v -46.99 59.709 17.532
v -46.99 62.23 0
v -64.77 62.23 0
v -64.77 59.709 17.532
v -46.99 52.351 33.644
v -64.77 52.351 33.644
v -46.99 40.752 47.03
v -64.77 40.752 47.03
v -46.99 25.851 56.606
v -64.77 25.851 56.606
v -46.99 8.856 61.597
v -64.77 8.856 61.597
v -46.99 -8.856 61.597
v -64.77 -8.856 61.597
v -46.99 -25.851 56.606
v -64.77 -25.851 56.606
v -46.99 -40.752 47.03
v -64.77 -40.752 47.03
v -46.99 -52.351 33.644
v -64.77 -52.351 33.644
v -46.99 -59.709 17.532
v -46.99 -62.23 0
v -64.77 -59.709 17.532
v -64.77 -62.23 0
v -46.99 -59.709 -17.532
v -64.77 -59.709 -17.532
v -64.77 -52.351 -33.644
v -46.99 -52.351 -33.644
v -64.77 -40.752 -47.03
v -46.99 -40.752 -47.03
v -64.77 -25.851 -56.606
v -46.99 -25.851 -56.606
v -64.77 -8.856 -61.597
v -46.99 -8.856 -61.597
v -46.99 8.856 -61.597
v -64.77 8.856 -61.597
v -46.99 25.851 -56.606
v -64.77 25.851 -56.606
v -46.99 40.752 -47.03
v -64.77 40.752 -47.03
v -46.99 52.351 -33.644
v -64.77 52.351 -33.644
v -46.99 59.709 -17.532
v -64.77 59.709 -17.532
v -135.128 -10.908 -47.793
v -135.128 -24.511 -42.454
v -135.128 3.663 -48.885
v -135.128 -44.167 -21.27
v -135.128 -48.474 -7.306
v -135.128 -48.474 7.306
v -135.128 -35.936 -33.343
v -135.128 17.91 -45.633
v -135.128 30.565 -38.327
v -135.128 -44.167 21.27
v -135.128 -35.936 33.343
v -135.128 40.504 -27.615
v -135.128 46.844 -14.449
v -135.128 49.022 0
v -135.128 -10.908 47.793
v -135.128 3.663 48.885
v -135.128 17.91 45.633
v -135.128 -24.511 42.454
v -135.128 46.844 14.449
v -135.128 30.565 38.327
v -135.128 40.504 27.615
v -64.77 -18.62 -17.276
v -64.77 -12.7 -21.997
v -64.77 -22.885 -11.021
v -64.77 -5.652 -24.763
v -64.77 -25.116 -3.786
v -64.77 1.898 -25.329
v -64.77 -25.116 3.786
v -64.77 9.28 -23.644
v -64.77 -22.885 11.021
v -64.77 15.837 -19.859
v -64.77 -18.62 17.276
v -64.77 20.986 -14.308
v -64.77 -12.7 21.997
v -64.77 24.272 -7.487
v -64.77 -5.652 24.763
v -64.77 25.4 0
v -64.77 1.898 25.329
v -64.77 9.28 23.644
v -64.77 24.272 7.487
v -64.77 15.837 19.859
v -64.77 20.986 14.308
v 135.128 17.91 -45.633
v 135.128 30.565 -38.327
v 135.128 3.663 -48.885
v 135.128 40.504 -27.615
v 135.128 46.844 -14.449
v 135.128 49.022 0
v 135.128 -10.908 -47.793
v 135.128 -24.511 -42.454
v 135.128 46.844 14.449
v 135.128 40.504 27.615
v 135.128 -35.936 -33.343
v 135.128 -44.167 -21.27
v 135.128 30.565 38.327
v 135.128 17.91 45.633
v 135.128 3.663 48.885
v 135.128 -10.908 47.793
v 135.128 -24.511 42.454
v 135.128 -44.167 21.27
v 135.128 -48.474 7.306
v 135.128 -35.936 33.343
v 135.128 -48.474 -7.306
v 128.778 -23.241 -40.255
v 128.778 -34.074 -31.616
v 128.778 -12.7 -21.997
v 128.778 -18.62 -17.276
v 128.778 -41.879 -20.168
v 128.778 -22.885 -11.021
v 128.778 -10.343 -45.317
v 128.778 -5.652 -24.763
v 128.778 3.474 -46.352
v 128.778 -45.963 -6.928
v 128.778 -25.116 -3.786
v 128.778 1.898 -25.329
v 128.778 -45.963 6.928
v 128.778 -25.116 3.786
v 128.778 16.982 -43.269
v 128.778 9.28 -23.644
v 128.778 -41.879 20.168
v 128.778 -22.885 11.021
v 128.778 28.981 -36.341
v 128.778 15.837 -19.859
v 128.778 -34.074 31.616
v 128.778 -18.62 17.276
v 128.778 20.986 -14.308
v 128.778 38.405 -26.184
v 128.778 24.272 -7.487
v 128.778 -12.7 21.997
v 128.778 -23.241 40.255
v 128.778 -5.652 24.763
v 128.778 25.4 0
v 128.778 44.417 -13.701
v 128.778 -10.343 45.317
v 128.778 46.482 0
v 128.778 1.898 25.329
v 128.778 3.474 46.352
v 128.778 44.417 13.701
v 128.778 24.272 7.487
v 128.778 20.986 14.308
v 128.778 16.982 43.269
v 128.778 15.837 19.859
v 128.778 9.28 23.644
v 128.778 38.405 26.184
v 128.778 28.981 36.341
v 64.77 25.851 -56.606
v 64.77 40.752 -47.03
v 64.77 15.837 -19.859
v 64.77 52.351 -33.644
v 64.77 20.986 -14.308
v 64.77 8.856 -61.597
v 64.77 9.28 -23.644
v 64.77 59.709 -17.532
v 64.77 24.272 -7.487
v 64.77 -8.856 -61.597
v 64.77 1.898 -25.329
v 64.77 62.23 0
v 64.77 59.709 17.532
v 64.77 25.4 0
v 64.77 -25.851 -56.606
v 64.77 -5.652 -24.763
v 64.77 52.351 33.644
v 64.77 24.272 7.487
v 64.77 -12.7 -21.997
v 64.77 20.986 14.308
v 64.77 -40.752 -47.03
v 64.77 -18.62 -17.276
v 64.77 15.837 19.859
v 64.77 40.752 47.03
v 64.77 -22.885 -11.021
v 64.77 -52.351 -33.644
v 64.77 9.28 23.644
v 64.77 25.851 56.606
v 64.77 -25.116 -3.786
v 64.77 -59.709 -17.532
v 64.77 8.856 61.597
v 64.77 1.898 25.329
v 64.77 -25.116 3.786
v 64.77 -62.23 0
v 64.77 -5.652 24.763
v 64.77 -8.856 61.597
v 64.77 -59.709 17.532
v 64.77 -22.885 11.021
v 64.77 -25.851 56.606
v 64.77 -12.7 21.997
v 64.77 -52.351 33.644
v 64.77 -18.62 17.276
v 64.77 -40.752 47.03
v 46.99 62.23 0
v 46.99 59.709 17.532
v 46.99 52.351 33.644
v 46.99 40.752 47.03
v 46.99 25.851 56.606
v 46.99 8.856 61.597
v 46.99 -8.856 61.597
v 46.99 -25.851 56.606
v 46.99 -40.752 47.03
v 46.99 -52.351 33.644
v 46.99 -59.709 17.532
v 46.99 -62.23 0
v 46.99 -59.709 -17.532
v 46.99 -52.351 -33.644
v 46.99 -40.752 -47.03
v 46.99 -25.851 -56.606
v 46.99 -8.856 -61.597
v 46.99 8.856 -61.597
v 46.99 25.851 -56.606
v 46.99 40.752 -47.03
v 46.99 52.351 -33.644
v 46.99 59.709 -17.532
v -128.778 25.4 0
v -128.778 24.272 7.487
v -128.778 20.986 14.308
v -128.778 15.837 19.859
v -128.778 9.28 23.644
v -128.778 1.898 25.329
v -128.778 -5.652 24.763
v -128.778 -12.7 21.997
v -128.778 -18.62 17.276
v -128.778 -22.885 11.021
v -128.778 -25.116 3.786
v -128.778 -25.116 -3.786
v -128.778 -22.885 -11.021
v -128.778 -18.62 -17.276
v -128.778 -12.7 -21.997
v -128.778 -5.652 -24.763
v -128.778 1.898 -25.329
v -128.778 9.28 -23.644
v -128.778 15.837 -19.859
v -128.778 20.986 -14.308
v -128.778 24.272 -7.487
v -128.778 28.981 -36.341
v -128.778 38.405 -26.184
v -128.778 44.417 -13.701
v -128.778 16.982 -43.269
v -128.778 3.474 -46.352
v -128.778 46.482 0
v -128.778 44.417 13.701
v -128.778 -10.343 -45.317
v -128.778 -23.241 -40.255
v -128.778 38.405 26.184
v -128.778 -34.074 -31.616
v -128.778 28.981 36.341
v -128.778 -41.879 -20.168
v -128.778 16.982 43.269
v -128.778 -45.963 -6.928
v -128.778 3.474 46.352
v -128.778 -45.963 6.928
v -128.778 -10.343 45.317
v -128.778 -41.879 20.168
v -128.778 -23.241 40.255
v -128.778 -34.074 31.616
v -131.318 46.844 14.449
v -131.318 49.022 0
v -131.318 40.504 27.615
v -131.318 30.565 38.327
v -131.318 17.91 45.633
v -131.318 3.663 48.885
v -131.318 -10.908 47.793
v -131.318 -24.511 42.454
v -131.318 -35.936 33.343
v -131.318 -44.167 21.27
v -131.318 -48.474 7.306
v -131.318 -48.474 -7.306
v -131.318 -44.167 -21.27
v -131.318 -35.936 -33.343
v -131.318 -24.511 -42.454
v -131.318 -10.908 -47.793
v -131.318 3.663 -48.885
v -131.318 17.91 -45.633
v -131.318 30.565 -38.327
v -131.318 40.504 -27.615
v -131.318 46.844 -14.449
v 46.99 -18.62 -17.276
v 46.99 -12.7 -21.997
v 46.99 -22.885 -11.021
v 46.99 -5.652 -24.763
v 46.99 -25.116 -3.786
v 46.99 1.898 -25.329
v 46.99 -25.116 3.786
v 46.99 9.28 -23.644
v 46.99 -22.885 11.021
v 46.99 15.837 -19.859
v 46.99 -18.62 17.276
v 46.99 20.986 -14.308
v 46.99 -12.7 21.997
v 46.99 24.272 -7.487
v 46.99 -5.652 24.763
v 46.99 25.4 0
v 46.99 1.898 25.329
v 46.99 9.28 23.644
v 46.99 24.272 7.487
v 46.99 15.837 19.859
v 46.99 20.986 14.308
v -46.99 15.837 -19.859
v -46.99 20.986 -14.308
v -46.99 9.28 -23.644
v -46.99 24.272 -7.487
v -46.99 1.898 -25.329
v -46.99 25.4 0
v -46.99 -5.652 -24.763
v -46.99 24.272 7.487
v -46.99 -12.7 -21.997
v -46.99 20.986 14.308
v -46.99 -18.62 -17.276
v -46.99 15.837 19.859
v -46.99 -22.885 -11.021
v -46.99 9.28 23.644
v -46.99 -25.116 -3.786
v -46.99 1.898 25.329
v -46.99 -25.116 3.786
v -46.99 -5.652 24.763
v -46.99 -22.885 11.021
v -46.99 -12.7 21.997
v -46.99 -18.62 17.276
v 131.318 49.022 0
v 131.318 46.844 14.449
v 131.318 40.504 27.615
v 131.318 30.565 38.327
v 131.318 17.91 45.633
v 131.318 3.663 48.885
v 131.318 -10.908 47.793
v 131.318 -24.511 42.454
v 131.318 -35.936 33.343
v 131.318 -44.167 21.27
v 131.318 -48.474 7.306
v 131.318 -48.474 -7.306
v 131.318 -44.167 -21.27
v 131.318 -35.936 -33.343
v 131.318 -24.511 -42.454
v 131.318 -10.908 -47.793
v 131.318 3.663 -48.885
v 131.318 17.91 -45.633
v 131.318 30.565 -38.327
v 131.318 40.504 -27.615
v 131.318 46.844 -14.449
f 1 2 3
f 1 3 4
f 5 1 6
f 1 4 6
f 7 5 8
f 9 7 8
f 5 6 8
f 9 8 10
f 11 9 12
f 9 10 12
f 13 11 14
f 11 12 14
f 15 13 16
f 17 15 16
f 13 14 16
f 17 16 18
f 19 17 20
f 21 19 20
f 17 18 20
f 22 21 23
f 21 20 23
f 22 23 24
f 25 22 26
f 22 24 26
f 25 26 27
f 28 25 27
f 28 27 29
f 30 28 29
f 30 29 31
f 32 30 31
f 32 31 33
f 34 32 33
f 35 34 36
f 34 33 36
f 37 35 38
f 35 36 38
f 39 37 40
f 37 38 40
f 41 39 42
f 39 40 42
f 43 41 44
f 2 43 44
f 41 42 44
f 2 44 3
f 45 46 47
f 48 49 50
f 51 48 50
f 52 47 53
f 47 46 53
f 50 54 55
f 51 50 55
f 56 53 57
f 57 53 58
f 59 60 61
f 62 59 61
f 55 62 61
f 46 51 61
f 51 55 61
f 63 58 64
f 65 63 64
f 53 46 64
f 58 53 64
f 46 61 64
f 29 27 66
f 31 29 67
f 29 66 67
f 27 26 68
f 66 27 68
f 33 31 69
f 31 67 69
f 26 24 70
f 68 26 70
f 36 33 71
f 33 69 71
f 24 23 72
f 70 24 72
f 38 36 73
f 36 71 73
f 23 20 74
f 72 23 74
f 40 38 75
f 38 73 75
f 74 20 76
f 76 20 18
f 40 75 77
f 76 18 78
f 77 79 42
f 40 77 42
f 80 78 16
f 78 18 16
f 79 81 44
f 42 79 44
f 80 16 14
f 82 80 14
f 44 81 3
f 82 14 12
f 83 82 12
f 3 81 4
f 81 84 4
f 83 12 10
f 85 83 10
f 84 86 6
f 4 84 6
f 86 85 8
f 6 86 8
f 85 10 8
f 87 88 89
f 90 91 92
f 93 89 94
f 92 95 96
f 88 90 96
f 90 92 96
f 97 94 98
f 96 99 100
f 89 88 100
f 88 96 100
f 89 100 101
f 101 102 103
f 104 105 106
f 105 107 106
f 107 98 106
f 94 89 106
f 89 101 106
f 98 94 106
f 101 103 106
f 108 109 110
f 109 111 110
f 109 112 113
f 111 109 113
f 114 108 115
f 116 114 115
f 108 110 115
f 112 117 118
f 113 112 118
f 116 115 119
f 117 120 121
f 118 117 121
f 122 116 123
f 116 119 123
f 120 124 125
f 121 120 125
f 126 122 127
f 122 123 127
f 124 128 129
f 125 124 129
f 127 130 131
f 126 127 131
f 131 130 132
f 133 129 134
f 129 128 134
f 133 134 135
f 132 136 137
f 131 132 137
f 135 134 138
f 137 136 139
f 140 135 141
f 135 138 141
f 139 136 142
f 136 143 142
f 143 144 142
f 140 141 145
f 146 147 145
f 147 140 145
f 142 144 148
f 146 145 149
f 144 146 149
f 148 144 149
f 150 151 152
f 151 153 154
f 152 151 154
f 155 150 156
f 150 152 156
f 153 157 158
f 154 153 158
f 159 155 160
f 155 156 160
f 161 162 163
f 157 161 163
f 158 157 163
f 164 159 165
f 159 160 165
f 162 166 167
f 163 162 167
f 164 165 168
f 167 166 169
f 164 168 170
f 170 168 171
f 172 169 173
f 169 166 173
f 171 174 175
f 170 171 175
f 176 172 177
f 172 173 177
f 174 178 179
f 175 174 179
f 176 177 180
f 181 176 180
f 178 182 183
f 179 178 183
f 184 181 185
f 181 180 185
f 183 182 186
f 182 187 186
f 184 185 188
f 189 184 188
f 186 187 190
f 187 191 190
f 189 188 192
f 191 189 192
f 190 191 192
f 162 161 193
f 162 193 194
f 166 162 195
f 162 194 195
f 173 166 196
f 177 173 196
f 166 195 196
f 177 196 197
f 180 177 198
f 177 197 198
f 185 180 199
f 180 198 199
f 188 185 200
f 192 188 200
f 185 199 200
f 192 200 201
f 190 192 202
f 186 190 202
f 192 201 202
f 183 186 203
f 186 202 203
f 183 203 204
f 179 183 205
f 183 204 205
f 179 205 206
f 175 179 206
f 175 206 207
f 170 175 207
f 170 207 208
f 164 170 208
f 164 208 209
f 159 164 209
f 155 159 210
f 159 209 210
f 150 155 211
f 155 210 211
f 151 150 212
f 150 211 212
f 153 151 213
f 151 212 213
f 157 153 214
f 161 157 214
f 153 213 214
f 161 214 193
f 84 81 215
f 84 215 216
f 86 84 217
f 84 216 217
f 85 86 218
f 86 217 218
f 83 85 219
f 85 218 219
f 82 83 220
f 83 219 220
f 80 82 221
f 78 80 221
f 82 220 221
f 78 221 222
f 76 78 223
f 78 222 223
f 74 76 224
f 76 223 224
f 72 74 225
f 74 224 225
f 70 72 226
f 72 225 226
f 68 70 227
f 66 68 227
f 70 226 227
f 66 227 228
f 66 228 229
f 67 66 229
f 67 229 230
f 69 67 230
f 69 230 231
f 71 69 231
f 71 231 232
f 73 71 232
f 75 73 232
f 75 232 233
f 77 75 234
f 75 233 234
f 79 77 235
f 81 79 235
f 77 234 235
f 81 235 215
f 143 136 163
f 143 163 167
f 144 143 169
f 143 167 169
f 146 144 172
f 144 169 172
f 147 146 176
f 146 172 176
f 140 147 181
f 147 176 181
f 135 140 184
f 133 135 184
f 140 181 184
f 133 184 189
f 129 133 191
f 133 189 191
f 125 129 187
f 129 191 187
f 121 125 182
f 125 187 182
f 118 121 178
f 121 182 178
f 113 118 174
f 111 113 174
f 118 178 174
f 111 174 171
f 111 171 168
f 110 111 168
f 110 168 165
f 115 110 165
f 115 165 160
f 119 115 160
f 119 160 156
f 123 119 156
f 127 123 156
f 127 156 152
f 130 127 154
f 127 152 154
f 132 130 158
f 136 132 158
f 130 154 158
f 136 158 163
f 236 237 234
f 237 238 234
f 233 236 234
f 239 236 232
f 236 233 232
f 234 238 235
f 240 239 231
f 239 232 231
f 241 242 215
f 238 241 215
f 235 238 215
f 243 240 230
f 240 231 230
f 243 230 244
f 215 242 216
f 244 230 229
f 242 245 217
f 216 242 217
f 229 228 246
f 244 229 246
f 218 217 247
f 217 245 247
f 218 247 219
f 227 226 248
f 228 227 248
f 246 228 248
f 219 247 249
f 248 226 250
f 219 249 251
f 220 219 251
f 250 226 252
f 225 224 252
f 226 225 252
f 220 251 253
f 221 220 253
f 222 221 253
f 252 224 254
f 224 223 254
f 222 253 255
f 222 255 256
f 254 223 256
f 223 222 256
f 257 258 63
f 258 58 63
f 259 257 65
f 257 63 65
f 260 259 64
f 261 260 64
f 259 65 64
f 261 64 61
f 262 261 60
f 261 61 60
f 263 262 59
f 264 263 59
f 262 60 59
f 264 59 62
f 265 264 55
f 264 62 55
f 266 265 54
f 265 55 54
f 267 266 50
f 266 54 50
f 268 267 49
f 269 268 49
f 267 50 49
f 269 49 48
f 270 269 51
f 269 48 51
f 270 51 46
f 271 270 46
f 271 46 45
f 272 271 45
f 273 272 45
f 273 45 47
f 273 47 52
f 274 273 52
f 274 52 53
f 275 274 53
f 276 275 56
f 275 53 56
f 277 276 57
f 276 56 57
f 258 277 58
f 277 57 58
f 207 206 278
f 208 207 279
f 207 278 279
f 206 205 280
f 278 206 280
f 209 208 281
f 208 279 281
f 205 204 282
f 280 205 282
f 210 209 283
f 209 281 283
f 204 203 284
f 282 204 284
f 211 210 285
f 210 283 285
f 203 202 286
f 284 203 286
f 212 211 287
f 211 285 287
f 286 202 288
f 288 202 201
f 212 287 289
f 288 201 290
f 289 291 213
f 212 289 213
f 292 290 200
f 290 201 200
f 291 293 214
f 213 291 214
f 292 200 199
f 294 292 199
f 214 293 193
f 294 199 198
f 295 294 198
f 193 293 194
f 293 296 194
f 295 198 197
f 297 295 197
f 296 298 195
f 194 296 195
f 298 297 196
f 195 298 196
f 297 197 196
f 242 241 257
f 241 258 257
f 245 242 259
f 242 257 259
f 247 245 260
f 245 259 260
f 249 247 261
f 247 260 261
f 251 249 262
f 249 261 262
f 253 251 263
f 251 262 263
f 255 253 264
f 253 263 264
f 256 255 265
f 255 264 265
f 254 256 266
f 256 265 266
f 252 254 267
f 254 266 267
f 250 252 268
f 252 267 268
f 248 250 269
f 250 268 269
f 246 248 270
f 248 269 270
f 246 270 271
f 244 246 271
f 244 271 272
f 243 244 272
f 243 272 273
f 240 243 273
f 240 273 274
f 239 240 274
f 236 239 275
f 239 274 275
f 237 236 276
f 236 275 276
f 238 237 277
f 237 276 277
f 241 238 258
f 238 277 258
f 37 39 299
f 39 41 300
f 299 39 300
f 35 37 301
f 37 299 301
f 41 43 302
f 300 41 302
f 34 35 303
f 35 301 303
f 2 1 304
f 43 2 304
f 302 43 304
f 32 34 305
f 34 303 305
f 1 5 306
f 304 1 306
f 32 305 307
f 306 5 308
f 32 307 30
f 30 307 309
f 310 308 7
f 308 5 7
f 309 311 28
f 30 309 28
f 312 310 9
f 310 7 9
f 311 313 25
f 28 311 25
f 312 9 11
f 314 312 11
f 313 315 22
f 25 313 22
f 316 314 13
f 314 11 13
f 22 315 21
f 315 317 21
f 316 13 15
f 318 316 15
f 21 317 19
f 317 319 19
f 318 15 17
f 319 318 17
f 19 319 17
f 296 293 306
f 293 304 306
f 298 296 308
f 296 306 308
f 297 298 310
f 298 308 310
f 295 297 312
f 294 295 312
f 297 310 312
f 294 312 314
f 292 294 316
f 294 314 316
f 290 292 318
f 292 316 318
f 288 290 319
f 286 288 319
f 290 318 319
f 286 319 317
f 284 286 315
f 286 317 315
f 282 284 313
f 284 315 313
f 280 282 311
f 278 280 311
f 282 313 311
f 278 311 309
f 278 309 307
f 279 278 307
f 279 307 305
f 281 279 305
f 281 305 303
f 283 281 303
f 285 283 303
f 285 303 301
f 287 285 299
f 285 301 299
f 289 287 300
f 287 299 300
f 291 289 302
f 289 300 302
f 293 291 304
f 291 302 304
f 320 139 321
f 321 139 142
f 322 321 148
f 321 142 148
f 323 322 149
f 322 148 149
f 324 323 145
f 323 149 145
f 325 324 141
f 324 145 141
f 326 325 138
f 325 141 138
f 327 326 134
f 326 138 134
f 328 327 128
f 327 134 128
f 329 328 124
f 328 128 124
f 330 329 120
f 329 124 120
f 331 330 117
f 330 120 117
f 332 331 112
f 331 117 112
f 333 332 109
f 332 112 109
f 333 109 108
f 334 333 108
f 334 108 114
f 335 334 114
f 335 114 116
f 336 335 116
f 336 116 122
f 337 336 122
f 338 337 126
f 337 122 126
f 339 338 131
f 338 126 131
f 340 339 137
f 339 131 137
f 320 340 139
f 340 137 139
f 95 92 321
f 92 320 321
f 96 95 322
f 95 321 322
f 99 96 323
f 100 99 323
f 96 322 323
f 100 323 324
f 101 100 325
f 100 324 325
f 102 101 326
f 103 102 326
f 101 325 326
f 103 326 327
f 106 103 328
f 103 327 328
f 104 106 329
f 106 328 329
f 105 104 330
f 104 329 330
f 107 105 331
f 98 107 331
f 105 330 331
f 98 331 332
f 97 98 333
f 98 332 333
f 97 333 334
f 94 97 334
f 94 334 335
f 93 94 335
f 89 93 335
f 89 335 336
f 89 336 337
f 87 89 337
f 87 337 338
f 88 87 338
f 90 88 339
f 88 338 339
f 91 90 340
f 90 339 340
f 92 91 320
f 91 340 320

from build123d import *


with BuildPart() as part:
    # Sketch1 → Revolve1 (revolve)
    with BuildSketch(Plane.XY):
        Polygon((-135.128, 49.022), (-135.128, 0), (0, 0), (0, 25.4), (-46.99, 25.4), (-46.99, 62.23), (-64.77, 62.23), (-64.77, 25.4), (-128.778, 25.4), (-128.778, 46.482), (-131.318, 49.022), align=None)
        Polygon((0, 25.4), (0, 0), (135.128, 0), (135.128, 49.022), (131.318, 49.022), (128.778, 46.482), (128.778, 25.4), (64.77, 25.4), (64.77, 62.23), (46.99, 62.23), (46.99, 25.4), align=None)
    revolve(axis=Axis((-135.128, 0, 0), (1, 0, 0)))


solid = part.part
